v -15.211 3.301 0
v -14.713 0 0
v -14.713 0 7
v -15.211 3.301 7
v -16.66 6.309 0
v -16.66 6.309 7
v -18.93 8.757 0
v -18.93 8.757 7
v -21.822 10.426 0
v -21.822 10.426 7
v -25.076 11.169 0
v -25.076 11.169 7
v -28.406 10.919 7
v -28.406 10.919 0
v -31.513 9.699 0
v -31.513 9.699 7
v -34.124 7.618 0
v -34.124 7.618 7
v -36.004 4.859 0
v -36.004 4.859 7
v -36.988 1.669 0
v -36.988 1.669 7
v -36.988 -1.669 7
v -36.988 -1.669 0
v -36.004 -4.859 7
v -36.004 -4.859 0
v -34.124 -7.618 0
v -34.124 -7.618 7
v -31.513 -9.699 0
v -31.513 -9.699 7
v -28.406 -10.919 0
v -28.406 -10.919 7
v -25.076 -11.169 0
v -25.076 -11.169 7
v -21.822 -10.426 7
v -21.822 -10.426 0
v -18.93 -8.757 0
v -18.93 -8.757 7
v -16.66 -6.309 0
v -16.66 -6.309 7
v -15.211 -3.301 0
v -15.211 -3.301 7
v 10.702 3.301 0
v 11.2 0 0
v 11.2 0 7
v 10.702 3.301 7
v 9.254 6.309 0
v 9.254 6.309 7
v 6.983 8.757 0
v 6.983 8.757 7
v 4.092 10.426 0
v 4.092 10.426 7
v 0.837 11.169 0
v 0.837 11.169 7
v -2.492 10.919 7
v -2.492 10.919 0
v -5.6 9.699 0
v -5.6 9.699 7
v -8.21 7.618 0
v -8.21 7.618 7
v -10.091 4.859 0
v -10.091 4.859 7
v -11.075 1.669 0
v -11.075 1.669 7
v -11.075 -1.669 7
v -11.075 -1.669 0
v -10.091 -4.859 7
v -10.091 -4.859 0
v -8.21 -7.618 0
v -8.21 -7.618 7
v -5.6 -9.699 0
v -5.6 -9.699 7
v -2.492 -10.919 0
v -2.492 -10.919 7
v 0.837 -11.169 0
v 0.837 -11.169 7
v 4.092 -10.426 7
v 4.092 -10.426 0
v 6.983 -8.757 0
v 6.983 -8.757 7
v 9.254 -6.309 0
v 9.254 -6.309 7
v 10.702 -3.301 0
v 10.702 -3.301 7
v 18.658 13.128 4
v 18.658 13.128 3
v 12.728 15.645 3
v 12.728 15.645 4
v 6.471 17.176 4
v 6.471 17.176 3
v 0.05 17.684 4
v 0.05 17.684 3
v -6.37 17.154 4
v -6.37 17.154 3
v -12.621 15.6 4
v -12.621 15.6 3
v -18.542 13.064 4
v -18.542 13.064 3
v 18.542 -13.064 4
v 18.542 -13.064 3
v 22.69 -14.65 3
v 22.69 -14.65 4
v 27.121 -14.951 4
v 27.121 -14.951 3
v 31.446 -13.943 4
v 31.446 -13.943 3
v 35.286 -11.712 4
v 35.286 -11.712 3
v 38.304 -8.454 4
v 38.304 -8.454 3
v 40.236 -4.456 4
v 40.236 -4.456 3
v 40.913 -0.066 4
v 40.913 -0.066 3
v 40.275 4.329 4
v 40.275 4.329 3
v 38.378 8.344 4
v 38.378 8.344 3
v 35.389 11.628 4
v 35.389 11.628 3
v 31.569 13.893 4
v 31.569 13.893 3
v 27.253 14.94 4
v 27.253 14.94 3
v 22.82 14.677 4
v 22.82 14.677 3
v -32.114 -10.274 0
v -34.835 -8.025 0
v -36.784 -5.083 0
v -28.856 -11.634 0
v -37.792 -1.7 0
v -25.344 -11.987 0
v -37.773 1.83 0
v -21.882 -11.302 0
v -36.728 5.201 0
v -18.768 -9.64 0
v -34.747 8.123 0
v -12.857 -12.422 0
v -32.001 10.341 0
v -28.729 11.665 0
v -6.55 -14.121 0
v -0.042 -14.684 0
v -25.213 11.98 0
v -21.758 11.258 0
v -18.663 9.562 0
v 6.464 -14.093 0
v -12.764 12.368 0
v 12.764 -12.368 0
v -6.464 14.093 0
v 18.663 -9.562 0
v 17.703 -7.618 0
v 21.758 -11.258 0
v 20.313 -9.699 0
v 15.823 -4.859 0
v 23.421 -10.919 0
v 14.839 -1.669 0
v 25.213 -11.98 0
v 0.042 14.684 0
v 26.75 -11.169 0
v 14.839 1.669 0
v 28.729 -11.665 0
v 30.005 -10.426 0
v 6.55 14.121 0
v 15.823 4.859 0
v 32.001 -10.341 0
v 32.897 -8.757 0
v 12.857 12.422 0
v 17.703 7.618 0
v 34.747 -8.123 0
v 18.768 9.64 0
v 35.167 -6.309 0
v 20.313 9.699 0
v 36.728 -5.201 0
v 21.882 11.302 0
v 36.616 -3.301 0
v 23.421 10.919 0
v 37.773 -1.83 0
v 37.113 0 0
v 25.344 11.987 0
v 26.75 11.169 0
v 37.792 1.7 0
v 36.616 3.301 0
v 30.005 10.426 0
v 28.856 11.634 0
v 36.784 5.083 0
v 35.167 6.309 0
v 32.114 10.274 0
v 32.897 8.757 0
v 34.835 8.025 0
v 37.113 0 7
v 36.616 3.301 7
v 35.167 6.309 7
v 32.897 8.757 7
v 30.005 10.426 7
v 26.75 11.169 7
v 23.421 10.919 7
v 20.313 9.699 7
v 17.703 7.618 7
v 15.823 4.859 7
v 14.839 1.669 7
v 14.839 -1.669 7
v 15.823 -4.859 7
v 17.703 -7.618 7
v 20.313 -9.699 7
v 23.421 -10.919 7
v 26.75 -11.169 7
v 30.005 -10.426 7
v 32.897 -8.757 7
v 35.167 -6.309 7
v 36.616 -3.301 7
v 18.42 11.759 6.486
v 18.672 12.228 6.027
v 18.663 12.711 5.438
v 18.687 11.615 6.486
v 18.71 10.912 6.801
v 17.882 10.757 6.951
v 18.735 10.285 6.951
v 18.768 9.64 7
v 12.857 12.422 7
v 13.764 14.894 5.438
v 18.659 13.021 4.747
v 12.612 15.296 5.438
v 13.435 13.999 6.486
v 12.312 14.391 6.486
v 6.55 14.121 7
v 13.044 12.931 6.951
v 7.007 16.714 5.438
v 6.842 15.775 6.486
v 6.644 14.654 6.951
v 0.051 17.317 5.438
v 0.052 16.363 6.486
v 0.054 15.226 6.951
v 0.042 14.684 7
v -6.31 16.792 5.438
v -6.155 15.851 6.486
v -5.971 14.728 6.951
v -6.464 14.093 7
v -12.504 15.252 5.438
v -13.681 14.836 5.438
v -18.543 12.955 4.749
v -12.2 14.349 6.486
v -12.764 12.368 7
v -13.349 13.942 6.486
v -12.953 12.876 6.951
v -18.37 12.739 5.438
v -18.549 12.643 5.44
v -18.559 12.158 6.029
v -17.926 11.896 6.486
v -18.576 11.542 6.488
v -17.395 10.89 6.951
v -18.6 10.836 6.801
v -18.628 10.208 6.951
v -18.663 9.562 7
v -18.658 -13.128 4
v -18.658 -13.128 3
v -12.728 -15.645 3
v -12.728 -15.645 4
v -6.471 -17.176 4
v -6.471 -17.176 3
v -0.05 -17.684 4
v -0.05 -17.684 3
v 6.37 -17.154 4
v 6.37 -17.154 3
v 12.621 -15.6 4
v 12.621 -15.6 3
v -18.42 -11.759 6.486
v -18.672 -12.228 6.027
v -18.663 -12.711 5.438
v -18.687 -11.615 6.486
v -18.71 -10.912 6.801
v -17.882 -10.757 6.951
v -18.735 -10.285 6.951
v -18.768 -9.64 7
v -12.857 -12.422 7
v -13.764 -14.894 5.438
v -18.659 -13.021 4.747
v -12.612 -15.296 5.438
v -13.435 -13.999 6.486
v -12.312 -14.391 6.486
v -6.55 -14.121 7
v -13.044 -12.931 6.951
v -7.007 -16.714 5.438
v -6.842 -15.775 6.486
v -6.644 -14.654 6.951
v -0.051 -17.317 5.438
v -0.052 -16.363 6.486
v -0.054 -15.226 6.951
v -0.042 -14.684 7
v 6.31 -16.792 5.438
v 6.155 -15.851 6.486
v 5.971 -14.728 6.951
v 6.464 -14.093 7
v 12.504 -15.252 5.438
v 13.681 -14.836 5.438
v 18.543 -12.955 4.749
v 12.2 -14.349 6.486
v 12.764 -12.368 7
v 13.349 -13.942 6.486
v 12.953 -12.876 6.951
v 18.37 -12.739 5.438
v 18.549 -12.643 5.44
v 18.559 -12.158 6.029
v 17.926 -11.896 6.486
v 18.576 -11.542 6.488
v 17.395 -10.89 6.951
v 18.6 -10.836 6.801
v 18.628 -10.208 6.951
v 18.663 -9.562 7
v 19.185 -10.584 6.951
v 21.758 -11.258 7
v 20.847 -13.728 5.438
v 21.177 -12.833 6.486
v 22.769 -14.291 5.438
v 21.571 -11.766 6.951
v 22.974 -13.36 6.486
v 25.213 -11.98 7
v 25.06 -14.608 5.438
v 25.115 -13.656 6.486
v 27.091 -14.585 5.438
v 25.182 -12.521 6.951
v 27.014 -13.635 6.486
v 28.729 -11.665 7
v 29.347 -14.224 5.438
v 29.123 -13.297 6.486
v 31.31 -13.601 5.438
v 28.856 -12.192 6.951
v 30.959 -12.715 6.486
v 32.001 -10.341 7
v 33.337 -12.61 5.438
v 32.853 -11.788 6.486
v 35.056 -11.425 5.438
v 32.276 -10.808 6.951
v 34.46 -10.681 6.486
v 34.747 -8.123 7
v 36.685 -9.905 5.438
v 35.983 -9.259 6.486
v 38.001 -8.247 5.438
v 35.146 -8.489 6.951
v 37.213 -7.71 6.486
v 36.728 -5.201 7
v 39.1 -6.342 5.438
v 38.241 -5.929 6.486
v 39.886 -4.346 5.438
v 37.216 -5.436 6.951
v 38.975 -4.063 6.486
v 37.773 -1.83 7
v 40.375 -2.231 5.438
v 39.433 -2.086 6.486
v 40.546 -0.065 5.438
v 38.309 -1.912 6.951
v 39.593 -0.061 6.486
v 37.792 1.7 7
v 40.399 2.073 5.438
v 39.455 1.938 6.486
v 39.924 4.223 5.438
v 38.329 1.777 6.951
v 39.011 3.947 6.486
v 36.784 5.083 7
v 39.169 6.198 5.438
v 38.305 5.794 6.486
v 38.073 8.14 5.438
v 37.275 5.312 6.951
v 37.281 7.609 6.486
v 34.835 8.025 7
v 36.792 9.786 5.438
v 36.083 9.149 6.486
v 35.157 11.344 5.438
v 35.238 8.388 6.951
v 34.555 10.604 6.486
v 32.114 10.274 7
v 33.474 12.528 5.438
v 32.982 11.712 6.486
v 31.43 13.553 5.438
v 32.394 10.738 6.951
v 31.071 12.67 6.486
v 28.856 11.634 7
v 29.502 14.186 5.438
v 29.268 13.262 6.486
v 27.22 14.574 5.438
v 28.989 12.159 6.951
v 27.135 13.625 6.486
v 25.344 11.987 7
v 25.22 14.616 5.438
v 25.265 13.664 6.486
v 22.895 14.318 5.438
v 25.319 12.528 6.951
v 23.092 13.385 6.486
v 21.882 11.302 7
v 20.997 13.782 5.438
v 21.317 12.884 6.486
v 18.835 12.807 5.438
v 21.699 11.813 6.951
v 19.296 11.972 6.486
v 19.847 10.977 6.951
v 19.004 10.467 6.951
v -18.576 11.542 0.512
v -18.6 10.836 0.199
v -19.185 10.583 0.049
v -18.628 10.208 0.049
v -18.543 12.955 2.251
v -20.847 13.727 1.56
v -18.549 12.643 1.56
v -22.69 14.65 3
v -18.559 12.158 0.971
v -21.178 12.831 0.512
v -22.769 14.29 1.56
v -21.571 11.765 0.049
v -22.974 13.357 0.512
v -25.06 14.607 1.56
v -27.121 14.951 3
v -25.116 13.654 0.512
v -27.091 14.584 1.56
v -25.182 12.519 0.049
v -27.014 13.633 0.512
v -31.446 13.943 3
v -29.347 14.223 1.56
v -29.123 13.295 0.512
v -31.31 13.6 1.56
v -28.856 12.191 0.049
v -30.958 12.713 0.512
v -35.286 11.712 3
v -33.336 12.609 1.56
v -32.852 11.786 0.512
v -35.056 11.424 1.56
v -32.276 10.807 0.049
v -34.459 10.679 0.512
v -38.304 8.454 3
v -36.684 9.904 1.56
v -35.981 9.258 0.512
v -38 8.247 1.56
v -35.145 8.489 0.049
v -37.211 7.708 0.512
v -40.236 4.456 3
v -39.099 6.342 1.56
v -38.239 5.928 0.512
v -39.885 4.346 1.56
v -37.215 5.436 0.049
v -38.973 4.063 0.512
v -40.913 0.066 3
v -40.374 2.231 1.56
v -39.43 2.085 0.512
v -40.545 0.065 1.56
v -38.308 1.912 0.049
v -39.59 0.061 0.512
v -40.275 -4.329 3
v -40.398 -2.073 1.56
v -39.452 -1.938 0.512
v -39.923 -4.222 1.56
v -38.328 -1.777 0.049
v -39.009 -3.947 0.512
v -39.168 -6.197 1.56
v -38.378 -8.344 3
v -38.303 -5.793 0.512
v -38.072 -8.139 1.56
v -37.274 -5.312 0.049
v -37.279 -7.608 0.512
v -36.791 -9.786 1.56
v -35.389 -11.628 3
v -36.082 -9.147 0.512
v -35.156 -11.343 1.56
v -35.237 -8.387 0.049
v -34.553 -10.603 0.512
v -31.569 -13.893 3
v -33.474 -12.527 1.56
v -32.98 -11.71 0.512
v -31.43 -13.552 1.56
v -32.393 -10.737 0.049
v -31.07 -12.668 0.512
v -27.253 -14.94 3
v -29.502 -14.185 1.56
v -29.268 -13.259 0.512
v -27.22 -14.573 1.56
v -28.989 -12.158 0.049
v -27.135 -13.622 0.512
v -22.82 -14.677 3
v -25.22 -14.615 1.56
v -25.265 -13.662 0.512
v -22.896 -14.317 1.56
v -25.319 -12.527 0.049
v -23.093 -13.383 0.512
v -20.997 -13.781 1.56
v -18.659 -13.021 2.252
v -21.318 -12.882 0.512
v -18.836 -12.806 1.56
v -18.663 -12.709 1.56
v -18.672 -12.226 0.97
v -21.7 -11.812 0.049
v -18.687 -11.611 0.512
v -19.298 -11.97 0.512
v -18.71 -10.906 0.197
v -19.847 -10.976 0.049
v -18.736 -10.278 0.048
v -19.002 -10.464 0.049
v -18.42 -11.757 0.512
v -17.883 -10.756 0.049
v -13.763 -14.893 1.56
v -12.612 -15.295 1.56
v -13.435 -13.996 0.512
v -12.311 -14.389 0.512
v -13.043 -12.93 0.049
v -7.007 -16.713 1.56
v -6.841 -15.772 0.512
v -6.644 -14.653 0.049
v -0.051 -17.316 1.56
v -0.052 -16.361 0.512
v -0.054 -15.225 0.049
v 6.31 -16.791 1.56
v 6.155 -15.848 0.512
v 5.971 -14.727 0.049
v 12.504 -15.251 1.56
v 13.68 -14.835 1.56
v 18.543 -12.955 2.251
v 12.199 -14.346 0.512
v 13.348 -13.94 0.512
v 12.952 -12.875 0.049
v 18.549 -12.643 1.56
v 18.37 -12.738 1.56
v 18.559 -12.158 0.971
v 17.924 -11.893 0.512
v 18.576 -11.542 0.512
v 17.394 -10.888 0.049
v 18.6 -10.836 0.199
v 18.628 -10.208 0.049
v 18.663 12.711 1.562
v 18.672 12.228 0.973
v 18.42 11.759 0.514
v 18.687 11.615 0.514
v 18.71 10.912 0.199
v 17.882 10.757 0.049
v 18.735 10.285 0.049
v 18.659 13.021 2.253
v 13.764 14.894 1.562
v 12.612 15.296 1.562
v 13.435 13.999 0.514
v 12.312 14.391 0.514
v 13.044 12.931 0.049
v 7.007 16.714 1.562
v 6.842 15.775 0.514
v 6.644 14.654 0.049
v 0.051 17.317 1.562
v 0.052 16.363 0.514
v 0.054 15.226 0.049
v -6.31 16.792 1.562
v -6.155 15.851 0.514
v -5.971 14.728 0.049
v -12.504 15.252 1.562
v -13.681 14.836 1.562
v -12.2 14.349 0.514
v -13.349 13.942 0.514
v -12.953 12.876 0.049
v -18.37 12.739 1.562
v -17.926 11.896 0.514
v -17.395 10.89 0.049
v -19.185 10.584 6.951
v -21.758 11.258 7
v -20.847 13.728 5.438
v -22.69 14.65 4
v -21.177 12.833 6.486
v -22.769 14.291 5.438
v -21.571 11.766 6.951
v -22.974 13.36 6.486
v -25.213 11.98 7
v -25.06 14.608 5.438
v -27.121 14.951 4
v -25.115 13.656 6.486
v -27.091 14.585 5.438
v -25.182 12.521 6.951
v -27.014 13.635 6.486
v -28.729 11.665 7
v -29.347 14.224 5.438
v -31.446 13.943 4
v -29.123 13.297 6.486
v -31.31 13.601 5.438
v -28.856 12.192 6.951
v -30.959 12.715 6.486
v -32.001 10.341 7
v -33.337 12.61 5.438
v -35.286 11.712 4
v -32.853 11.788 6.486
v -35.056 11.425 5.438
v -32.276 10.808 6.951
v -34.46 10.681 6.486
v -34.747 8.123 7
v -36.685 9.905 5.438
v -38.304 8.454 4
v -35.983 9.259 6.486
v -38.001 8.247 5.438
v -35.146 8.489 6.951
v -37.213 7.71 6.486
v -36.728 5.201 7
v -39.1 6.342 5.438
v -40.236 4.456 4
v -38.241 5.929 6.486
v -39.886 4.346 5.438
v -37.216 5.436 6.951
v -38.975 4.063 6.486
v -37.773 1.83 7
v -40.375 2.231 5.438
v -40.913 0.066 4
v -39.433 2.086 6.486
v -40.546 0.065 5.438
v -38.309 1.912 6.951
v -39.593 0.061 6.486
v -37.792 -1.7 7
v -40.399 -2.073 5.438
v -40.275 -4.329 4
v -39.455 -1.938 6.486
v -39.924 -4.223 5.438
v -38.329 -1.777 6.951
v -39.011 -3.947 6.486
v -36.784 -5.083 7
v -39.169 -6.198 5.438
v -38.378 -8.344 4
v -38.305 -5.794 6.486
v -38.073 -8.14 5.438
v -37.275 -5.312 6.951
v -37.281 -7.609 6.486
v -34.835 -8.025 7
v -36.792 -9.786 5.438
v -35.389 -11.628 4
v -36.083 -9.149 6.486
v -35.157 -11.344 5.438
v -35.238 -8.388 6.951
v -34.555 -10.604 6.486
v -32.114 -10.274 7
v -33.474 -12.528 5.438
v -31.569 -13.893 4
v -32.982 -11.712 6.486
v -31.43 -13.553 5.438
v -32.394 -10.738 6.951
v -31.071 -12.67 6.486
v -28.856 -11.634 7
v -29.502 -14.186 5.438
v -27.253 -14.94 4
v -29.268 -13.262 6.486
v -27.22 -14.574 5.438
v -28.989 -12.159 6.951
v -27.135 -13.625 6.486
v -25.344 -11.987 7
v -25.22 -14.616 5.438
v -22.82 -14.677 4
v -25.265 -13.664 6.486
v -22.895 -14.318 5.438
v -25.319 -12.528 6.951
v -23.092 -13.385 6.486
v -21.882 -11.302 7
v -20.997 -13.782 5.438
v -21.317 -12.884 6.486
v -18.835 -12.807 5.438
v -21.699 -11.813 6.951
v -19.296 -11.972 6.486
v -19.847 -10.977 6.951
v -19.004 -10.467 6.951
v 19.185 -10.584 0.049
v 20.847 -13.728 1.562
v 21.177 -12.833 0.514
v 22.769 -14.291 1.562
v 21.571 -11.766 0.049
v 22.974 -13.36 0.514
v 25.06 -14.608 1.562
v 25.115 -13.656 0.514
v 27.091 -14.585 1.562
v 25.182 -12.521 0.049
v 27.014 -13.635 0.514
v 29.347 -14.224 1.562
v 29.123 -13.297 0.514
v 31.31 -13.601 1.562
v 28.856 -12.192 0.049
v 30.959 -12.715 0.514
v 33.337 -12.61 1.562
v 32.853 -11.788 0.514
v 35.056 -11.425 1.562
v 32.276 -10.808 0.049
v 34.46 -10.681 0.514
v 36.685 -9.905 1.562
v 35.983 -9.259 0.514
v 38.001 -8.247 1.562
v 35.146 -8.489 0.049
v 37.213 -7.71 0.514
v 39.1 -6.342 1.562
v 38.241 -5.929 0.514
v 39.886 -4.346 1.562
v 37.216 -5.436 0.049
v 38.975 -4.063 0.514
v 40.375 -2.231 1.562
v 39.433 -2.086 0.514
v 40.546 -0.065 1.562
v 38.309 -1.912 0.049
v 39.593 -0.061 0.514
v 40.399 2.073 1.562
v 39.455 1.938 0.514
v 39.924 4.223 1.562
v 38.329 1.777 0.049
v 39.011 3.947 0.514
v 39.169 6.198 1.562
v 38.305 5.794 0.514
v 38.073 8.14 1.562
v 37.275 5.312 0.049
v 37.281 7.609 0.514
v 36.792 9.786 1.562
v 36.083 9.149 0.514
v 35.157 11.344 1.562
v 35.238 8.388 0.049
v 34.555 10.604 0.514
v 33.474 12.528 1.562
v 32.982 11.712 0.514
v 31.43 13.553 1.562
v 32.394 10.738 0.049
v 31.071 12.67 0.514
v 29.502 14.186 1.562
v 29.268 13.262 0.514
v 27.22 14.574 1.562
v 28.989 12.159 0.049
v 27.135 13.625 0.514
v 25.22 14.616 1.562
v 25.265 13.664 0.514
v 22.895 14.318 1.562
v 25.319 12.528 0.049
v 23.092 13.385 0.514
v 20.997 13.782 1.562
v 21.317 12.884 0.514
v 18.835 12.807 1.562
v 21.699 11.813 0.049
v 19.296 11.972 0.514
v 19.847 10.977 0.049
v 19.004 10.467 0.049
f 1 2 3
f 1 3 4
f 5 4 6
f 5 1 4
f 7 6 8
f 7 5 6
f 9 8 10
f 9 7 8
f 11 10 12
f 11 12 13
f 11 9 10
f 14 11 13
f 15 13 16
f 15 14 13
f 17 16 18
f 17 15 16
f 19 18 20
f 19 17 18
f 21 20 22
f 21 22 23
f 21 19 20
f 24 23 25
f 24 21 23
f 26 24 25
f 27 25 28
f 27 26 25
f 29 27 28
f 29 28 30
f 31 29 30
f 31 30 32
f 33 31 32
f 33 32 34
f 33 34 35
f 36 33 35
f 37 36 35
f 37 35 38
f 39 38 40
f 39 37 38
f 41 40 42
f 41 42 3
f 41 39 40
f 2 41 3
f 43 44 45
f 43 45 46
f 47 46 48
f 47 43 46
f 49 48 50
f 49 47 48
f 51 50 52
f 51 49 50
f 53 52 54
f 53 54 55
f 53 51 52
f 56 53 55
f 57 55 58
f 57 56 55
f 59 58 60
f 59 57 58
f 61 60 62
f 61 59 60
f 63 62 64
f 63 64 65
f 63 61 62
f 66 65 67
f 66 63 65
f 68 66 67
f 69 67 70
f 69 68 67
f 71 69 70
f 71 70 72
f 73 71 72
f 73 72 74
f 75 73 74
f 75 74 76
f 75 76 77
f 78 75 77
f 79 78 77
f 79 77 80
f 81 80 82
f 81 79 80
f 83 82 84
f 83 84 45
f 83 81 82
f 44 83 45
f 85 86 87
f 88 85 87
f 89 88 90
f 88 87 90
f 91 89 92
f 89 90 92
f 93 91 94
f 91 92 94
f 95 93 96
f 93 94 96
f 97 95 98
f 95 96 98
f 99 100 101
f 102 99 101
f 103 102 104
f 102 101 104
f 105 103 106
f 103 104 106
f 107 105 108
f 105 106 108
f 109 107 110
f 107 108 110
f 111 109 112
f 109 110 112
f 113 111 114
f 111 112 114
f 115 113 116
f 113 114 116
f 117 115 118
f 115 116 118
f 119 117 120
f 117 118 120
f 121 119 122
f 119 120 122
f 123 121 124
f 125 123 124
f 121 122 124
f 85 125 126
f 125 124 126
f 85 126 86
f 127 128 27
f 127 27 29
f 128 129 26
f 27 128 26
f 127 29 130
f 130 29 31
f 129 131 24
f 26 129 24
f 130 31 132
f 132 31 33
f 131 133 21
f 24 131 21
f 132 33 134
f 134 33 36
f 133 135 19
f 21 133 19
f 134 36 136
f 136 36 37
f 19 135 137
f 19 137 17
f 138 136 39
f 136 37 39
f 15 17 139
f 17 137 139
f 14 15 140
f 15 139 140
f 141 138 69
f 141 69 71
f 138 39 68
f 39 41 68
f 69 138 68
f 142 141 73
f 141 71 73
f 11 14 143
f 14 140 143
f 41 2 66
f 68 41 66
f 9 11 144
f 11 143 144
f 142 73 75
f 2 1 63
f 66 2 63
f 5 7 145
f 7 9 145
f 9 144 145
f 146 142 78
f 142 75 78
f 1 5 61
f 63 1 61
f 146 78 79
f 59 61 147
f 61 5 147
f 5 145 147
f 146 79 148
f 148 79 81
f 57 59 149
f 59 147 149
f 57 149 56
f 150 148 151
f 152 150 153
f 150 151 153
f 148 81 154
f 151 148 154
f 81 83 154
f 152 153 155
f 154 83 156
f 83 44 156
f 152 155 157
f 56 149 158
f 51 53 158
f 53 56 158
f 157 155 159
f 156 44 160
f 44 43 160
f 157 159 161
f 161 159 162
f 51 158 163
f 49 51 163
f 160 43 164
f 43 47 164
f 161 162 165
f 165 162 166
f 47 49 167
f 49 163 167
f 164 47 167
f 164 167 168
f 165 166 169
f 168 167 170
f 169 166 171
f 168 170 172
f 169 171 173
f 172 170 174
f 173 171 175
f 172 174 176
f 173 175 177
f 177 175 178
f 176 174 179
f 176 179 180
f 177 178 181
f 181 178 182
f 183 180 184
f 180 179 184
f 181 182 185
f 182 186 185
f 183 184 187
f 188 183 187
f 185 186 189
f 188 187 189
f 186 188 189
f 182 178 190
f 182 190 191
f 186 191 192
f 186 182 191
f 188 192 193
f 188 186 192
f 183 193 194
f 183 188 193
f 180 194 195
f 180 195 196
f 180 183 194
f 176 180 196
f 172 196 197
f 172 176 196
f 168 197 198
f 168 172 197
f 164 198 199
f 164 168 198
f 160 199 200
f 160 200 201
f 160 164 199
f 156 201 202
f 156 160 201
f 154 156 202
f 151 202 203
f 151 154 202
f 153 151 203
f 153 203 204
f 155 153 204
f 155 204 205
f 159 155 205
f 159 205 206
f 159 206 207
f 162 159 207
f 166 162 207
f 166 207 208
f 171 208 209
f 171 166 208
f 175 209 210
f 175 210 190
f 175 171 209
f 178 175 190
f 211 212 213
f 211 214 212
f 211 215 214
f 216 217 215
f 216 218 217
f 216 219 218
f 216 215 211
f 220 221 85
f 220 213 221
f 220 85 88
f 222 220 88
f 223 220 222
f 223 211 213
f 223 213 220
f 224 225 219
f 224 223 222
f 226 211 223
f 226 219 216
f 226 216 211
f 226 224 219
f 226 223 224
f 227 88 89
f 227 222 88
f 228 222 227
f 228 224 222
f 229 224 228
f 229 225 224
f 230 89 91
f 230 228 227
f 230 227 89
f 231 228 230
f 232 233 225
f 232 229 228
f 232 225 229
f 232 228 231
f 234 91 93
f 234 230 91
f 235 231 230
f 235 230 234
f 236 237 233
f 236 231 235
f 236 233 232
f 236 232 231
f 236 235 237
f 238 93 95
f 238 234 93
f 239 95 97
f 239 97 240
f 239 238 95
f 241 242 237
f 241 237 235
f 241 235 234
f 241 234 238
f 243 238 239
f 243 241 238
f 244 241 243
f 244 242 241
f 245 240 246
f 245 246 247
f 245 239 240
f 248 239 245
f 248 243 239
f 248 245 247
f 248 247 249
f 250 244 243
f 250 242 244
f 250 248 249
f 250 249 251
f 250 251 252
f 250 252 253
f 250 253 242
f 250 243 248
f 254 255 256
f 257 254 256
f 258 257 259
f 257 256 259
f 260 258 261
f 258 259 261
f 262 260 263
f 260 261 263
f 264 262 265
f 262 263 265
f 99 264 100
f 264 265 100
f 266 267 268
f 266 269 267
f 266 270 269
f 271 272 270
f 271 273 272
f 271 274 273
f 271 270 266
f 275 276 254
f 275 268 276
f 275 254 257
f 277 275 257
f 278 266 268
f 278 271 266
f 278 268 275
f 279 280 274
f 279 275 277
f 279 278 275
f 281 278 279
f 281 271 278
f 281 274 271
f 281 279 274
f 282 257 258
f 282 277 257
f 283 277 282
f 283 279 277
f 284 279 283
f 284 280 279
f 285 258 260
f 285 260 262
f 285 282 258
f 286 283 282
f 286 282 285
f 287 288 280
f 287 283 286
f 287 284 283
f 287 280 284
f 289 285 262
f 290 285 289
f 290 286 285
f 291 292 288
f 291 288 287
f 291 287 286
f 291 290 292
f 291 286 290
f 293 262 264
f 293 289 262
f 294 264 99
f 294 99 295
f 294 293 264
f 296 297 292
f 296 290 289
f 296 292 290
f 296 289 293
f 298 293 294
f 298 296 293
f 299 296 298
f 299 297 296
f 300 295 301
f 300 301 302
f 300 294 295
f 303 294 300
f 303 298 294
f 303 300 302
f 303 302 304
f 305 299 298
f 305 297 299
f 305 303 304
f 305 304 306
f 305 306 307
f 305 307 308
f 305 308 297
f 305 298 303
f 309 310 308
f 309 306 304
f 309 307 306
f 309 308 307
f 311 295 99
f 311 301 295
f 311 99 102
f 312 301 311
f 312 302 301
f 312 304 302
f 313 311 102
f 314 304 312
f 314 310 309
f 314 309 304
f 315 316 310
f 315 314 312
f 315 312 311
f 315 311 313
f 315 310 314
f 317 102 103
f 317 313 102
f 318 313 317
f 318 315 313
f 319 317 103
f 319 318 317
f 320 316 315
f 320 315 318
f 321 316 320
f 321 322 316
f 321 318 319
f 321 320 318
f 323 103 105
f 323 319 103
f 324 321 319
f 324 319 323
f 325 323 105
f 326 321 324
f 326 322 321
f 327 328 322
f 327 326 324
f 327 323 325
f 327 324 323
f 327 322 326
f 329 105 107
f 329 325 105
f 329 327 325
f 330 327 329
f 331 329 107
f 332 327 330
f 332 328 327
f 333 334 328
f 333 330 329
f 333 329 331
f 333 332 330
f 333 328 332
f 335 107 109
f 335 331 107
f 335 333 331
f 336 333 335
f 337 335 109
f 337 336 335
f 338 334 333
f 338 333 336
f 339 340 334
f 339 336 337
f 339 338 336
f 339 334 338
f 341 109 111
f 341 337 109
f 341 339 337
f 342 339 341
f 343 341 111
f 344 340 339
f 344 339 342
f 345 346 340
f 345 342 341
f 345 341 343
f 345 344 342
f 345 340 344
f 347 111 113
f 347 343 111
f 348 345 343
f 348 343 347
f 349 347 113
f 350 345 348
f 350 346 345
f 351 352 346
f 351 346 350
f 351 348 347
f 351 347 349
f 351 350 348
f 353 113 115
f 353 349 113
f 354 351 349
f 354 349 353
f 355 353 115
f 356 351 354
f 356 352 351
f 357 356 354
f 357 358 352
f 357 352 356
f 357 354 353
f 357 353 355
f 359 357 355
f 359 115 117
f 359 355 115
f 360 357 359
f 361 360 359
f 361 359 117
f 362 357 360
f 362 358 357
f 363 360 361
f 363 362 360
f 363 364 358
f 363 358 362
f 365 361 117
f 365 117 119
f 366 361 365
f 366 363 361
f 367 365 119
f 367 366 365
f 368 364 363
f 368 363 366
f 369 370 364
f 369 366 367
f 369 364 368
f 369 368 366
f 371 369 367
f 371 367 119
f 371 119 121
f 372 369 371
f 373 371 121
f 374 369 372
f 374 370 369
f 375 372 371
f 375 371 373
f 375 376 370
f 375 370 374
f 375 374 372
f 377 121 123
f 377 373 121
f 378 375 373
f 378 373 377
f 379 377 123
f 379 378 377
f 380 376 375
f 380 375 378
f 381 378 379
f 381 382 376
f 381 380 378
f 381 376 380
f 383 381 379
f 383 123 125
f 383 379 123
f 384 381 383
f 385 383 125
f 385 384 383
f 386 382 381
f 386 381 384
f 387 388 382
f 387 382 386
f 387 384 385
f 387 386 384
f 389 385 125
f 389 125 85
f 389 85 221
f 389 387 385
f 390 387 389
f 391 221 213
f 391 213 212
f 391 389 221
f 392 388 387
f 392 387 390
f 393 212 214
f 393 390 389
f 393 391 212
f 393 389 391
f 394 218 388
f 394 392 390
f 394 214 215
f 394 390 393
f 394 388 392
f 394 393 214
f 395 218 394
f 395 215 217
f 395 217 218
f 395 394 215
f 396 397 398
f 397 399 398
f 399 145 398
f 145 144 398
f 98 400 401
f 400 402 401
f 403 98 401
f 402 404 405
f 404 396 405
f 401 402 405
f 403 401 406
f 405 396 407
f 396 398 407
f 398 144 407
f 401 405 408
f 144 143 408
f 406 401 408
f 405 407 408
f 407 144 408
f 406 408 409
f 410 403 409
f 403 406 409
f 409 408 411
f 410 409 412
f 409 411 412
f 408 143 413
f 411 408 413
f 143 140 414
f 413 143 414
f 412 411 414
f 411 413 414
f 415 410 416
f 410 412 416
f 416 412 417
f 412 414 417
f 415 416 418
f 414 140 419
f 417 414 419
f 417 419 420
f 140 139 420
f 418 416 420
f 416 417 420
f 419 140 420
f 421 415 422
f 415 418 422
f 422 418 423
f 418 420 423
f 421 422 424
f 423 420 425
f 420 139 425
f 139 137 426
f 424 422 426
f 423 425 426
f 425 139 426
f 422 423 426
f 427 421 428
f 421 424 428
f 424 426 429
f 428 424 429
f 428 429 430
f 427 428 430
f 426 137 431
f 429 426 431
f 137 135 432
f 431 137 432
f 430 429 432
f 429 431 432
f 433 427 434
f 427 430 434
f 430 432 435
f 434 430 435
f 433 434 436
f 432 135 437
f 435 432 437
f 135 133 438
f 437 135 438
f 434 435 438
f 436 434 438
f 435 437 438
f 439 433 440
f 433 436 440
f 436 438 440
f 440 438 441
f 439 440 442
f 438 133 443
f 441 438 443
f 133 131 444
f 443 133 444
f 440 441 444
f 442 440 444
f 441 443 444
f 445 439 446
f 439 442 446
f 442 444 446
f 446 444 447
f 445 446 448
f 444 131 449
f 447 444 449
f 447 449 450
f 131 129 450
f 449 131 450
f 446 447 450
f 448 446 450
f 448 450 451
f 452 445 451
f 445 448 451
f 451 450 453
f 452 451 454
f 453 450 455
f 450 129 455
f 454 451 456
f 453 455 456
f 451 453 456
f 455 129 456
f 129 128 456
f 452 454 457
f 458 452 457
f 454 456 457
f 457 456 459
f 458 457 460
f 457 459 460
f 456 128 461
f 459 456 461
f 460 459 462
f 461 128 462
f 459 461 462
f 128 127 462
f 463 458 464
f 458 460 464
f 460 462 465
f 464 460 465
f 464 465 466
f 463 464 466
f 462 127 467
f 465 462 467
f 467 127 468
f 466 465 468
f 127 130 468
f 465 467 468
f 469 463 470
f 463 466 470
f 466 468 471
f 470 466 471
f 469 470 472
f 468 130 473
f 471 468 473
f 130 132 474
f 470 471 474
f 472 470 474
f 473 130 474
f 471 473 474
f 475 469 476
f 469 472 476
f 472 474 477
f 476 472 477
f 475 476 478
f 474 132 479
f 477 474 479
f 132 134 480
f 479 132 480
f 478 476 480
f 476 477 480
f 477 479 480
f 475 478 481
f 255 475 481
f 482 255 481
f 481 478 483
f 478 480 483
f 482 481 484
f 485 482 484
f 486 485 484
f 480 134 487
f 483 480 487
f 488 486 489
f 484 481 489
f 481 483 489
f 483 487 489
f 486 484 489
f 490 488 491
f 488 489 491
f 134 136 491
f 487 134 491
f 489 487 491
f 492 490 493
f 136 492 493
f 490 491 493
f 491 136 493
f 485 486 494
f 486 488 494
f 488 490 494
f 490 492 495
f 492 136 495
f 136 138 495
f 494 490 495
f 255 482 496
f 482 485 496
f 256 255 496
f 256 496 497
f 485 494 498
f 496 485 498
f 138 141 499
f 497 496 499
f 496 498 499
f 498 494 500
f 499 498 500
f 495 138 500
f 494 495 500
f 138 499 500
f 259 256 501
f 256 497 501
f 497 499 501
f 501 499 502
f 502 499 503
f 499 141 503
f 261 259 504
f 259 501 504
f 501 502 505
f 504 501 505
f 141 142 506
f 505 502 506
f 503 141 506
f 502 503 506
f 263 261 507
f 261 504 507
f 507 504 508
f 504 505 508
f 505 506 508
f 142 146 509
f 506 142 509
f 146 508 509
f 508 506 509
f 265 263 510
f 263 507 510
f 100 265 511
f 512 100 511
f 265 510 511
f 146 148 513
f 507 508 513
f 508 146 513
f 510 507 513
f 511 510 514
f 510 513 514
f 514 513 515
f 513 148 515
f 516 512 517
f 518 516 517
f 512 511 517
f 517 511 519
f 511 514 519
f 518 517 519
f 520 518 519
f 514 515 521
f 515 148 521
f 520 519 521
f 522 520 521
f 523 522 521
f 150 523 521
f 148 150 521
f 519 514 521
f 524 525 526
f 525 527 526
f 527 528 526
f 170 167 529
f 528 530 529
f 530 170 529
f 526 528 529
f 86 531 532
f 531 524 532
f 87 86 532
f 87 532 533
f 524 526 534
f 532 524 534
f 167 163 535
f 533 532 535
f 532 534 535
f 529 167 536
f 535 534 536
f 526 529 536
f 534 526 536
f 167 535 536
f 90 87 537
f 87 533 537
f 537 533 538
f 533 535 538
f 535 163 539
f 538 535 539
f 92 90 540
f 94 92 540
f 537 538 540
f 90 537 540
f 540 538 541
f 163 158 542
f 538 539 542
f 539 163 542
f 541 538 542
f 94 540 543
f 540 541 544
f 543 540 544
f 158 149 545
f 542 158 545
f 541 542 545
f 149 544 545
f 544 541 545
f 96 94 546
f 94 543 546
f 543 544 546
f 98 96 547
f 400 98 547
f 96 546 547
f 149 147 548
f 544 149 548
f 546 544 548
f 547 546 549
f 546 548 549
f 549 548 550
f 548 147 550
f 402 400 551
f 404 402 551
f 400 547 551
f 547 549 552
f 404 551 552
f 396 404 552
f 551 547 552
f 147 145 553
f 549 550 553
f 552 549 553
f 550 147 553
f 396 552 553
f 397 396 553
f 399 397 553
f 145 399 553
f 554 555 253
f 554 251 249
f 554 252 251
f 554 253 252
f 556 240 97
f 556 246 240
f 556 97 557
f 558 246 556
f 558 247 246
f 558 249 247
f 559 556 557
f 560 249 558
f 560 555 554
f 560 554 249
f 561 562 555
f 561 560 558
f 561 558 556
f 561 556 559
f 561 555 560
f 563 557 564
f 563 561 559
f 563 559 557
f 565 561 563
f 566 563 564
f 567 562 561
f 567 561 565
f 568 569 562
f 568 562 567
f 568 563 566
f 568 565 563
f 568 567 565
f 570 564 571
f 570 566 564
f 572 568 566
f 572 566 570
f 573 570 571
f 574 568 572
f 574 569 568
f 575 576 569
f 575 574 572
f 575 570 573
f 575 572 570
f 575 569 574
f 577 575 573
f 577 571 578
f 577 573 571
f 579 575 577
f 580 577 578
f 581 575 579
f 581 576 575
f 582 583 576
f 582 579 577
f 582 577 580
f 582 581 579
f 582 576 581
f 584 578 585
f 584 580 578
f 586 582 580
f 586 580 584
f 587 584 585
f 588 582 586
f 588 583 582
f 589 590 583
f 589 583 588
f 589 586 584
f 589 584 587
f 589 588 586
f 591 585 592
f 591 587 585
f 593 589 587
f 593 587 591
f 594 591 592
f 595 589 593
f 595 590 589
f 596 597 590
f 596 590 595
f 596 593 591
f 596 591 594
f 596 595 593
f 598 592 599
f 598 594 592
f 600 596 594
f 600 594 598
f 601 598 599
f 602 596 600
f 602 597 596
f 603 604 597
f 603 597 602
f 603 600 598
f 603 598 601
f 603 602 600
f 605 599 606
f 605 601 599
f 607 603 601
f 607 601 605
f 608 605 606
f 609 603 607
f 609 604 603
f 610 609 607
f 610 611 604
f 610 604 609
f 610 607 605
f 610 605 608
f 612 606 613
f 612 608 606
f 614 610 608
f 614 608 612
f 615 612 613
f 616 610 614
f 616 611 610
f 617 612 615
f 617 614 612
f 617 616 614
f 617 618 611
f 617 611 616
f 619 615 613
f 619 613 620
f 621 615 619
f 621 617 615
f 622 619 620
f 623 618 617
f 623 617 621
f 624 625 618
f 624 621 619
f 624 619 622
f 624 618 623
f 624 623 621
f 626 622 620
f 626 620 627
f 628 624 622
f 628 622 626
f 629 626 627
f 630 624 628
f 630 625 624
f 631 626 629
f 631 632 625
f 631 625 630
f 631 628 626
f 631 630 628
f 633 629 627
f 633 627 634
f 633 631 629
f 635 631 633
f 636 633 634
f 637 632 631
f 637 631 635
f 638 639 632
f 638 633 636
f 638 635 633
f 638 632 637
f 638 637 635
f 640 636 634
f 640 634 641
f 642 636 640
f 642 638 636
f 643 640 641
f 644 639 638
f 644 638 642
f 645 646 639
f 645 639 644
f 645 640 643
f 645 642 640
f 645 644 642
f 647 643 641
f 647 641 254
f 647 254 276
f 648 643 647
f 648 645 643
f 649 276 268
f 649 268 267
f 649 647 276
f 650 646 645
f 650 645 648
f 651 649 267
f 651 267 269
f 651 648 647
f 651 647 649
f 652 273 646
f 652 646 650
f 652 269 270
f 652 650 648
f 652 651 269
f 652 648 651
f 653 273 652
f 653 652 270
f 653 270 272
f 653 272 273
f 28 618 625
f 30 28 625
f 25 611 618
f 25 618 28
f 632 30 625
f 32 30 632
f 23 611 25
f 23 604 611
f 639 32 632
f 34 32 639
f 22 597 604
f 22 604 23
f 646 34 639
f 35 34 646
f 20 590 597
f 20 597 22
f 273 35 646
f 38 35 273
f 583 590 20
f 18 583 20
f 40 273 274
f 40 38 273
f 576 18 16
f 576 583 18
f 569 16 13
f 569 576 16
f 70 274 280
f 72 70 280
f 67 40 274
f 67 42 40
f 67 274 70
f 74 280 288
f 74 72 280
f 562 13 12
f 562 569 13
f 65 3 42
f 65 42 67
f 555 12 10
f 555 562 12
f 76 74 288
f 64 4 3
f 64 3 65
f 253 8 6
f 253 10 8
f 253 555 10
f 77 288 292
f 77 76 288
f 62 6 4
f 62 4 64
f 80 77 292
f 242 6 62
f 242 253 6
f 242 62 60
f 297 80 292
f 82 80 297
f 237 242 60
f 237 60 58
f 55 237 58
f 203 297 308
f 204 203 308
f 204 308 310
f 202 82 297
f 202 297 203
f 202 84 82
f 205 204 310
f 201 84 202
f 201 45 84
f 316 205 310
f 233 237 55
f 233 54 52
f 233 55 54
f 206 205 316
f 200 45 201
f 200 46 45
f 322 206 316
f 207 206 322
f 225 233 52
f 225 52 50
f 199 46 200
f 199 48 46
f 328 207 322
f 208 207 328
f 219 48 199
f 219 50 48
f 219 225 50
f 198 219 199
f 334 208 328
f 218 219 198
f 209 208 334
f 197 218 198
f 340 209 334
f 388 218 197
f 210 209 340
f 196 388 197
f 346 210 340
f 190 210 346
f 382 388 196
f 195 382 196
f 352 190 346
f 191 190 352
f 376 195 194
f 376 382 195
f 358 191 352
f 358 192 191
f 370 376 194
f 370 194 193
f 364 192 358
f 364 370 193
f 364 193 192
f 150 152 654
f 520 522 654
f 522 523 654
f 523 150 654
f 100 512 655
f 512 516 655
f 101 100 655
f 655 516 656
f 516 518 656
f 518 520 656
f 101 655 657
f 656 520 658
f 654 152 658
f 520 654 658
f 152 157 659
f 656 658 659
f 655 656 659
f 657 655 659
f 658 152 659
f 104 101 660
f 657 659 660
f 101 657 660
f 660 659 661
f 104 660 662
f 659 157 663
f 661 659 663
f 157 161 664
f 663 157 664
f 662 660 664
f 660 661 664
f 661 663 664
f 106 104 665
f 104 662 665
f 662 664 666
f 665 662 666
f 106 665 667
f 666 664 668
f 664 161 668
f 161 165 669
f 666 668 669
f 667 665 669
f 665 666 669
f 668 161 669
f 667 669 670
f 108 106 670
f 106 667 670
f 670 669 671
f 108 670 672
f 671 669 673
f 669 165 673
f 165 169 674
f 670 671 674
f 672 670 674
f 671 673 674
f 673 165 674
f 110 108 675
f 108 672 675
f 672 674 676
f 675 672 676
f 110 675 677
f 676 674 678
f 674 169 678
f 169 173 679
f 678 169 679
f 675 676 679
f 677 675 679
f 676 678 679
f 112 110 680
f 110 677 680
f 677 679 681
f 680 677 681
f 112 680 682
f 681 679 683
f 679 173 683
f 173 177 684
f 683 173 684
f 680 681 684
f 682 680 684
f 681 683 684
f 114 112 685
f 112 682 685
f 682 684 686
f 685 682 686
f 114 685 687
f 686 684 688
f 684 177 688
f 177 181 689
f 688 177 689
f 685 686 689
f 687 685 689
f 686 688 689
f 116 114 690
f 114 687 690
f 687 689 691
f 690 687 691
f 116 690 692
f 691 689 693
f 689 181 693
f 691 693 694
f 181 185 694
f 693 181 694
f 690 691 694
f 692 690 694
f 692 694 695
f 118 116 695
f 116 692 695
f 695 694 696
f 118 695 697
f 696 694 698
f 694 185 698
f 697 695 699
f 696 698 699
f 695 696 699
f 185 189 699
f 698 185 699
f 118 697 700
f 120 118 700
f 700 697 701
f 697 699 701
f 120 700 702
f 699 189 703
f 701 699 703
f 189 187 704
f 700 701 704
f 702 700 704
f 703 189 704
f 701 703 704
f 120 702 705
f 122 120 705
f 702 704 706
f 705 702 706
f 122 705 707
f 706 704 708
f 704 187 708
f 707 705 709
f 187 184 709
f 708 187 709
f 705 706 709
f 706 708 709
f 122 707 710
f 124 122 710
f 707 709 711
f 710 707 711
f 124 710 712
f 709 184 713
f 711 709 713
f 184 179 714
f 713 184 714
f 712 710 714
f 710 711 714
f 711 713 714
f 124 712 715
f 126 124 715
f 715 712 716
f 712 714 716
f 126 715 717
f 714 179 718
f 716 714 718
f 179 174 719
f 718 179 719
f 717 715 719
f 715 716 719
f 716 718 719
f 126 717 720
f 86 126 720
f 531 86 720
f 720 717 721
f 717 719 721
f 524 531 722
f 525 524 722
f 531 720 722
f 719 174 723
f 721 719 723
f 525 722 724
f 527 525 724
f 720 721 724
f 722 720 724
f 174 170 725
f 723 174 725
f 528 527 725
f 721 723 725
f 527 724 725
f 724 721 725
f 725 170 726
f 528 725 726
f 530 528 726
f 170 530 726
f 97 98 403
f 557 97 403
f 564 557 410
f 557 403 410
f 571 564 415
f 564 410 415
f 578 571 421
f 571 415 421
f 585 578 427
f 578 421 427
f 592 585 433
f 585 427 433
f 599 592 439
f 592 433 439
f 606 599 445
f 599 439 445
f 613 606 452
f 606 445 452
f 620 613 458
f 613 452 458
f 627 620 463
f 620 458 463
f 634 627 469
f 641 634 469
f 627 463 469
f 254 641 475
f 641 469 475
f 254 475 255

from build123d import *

# Parameters (mm, degrees)
F0_R     = 11.2
F1_DEPTH = 7
F2_R     = 3


with BuildPart() as f1:
    # F0 (on Top) → F1 (new body)
    with BuildSketch(Plane.XY):
        with BuildLine():
            ThreePointArc((18.657643, 13.128337), (0.049973, 17.68379), (-18.54173, 13.063603))
            ThreePointArc((-18.54173, 13.063603), (-40.913305, 0.066382), (-18.657643, -13.128337))
            ThreePointArc((-18.657643, -13.128337), (-0.049973, -17.68379), (18.54173, -13.063603))
            ThreePointArc((18.54173, -13.063603), (40.913305, -0.066382), (18.657643, 13.128337))
        make_face()
        with Locations((-25.913452, 0)):
            Circle(F0_R, mode=Mode.SUBTRACT)
        Circle(F0_R, mode=Mode.SUBTRACT)
        with Locations((25.913452, 0)):
            Circle(F0_R, mode=Mode.SUBTRACT)
    extrude(amount=F1_DEPTH)

    # F2
    f2_edges = [f1.edges().sort_by_distance(p)[0] for p in [
        (0.049973, 17.68379, 7),
        (40.913305, -0.066382, 7),
        (-0.049973, -17.68379, 7),
        (-40.913305, 0.066382, 0),
        (0.049973, 17.68379, 0),
        (40.913305, -0.066382, 0),
        (-0.049973, -17.68379, 0),
        (-40.913305, 0.066382, 7),
    ]]
    fillet(f2_edges, radius=F2_R)


solid = f1.part
